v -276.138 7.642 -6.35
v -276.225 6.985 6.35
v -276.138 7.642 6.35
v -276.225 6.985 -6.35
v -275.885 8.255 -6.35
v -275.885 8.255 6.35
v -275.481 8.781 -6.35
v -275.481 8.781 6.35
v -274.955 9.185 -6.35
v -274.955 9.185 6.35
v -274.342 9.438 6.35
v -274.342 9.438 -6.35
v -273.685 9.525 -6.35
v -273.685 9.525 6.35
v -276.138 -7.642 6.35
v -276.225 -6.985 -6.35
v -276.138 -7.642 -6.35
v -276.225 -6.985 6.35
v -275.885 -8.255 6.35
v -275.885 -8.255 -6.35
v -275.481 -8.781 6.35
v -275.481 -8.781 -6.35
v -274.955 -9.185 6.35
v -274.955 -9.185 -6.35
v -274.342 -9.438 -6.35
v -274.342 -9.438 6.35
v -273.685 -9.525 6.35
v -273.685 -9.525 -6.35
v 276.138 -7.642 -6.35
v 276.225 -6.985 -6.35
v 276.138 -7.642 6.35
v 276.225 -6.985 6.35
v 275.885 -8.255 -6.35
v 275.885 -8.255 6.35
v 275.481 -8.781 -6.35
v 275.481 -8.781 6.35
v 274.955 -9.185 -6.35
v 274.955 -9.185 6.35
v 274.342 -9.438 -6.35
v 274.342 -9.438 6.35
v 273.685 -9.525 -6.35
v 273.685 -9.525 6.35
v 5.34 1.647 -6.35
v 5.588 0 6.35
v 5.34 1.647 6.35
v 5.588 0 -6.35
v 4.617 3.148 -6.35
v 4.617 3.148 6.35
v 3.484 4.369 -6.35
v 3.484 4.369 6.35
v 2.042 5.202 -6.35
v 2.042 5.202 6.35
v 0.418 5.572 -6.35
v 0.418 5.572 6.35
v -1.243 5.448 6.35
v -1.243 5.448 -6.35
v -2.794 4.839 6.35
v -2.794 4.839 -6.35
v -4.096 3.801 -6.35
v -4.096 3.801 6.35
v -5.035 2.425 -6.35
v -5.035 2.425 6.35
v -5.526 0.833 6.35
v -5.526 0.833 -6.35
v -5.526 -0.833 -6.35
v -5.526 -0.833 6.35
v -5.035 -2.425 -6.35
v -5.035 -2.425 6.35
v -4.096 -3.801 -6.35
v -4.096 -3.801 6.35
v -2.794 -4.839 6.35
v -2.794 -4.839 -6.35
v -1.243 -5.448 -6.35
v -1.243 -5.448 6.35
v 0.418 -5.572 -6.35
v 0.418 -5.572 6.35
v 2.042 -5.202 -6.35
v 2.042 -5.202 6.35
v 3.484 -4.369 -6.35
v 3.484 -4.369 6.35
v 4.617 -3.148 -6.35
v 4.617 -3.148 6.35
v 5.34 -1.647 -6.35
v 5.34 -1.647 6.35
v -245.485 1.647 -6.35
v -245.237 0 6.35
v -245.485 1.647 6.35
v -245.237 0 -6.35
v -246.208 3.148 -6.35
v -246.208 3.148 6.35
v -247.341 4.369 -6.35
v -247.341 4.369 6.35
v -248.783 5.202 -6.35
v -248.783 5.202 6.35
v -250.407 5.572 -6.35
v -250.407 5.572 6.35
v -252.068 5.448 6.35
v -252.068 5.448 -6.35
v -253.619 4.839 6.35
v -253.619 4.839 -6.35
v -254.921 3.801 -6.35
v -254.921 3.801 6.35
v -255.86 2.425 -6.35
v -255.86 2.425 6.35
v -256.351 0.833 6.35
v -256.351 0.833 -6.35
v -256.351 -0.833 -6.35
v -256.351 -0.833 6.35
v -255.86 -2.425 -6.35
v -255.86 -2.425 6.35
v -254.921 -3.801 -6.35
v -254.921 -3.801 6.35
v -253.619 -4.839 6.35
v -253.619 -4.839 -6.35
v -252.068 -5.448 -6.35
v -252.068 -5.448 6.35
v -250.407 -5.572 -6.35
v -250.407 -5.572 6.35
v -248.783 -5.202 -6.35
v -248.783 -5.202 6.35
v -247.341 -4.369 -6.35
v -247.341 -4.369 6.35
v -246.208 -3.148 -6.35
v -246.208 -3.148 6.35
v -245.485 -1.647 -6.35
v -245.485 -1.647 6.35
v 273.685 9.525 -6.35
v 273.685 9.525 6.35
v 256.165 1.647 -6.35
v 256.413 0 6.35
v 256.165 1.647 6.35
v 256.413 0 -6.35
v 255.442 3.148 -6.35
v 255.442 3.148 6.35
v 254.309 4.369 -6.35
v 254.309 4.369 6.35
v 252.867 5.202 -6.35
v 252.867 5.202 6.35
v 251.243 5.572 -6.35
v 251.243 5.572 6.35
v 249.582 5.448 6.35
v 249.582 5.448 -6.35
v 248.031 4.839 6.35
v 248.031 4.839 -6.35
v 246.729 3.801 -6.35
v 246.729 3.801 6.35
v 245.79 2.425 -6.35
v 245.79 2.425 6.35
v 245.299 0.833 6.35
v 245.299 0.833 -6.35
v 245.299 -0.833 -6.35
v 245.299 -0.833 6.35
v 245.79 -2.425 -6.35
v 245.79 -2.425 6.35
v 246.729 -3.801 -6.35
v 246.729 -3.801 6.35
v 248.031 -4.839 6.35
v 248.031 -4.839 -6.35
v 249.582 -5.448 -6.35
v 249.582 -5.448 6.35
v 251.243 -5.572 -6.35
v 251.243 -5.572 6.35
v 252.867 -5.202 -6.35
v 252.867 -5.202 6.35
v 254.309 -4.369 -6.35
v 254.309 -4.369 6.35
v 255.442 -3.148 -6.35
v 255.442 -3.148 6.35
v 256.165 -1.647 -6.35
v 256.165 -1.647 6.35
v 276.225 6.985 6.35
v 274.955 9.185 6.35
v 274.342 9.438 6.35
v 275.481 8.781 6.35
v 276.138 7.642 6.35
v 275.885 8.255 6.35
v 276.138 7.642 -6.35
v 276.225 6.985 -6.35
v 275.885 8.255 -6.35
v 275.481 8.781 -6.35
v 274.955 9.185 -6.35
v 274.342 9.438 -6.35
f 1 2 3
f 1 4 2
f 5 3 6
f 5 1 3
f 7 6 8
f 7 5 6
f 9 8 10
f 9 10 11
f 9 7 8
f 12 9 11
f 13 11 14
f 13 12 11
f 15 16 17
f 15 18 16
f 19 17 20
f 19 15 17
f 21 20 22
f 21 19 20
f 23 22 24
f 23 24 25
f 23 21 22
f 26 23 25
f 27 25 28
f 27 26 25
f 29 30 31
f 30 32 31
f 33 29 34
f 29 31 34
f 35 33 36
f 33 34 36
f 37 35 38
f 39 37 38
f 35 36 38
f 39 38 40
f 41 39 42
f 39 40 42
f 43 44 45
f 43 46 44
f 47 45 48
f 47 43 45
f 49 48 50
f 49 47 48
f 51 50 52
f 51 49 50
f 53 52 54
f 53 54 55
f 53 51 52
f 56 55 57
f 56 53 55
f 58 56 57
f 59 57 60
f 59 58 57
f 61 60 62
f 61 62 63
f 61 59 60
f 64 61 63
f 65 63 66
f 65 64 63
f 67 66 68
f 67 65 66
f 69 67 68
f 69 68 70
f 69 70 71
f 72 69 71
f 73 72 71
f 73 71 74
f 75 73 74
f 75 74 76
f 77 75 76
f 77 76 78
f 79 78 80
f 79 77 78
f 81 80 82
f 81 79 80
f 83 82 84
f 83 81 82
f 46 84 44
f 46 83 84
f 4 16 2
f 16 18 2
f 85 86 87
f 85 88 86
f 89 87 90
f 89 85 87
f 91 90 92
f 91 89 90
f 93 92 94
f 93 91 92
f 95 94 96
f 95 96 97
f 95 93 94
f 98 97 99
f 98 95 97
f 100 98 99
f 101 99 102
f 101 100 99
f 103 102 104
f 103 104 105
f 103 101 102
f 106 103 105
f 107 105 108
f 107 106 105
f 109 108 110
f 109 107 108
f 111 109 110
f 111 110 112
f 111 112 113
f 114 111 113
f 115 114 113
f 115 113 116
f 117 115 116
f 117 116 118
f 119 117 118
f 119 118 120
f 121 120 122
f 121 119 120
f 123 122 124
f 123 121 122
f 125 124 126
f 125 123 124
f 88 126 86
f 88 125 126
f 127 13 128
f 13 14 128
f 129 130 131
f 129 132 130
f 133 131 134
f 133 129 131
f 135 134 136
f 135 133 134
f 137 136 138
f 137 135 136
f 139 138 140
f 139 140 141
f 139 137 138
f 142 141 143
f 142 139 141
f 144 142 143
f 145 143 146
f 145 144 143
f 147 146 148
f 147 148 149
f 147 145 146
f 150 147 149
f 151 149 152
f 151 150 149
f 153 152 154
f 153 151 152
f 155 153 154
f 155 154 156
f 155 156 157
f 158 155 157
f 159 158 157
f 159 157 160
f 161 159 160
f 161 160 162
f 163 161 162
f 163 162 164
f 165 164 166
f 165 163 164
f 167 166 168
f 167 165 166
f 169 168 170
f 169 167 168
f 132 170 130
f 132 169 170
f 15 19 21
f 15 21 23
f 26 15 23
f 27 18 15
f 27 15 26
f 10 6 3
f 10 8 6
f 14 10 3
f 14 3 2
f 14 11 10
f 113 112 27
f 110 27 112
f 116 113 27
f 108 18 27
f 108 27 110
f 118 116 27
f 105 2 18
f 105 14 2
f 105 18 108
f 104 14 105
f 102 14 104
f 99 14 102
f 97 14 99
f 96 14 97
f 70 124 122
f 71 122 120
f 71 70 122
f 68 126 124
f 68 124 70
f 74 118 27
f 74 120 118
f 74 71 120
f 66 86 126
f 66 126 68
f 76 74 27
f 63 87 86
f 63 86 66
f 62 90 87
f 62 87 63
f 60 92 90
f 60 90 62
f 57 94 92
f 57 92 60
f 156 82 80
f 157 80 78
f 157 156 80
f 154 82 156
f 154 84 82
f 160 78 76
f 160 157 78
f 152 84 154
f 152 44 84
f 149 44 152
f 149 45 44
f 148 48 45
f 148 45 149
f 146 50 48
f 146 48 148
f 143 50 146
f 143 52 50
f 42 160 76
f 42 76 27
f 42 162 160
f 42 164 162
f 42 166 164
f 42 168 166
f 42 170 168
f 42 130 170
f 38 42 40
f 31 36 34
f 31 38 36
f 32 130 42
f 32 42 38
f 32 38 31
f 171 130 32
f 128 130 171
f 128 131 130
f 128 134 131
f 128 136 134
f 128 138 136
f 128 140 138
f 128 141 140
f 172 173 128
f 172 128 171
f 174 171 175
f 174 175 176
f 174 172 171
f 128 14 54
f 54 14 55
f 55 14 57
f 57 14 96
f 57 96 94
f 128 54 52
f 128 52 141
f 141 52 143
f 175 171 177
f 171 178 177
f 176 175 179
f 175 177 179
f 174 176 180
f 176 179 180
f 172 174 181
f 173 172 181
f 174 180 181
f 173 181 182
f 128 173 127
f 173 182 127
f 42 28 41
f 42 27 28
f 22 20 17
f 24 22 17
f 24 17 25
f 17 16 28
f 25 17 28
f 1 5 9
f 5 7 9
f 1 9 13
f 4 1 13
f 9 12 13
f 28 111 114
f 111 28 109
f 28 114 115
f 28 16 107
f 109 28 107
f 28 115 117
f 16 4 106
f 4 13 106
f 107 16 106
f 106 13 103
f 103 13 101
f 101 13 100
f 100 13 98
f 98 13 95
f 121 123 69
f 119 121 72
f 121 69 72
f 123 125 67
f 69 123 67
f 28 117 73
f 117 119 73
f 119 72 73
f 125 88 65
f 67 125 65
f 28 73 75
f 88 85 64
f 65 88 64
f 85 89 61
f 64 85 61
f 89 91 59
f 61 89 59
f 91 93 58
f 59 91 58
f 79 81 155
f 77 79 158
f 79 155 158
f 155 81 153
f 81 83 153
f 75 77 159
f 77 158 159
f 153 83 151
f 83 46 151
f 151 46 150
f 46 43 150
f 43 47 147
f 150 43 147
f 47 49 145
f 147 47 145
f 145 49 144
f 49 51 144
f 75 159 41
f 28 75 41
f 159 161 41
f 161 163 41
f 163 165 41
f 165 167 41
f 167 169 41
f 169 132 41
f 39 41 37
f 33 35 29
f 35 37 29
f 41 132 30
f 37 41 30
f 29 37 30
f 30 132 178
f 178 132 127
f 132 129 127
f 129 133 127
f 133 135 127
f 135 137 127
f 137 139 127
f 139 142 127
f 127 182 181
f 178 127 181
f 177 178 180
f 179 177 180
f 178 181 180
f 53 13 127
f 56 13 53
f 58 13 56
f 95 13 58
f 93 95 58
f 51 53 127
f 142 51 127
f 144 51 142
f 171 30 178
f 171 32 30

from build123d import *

# Parameters (mm, degrees)
SKETCH1_W           = 552.45
SKETCH1_H           = 19.05
SKETCH1_R           = 5.588
BOSS_EXTRUDE1_DEPTH = 6.35
FILLET1_R           = 2.54


with BuildPart() as part:
    # Sketch1 → Boss-Extrude1 (new, symmetric)
    with BuildSketch(Plane.XY):
        Rectangle(SKETCH1_W, SKETCH1_H)
        Circle(SKETCH1_R, mode=Mode.SUBTRACT)
        with Locations((-250.825, 0)):
            Circle(SKETCH1_R, mode=Mode.SUBTRACT)
        with Locations((250.825, 0)):
            Circle(SKETCH1_R, mode=Mode.SUBTRACT)
    extrude(amount=BOSS_EXTRUDE1_DEPTH, both=True)

    # Fillet1
    fillet1_edges = [part.edges().sort_by_distance(p)[0] for p in [
        (276.225, -9.525, 0),
        (-276.225, -9.525, 0),
        (-276.225, 9.525, 0),
        (276.225, 9.525, 0),
    ]]
    fillet(fillet1_edges, radius=FILLET1_R)


solid = part.part
